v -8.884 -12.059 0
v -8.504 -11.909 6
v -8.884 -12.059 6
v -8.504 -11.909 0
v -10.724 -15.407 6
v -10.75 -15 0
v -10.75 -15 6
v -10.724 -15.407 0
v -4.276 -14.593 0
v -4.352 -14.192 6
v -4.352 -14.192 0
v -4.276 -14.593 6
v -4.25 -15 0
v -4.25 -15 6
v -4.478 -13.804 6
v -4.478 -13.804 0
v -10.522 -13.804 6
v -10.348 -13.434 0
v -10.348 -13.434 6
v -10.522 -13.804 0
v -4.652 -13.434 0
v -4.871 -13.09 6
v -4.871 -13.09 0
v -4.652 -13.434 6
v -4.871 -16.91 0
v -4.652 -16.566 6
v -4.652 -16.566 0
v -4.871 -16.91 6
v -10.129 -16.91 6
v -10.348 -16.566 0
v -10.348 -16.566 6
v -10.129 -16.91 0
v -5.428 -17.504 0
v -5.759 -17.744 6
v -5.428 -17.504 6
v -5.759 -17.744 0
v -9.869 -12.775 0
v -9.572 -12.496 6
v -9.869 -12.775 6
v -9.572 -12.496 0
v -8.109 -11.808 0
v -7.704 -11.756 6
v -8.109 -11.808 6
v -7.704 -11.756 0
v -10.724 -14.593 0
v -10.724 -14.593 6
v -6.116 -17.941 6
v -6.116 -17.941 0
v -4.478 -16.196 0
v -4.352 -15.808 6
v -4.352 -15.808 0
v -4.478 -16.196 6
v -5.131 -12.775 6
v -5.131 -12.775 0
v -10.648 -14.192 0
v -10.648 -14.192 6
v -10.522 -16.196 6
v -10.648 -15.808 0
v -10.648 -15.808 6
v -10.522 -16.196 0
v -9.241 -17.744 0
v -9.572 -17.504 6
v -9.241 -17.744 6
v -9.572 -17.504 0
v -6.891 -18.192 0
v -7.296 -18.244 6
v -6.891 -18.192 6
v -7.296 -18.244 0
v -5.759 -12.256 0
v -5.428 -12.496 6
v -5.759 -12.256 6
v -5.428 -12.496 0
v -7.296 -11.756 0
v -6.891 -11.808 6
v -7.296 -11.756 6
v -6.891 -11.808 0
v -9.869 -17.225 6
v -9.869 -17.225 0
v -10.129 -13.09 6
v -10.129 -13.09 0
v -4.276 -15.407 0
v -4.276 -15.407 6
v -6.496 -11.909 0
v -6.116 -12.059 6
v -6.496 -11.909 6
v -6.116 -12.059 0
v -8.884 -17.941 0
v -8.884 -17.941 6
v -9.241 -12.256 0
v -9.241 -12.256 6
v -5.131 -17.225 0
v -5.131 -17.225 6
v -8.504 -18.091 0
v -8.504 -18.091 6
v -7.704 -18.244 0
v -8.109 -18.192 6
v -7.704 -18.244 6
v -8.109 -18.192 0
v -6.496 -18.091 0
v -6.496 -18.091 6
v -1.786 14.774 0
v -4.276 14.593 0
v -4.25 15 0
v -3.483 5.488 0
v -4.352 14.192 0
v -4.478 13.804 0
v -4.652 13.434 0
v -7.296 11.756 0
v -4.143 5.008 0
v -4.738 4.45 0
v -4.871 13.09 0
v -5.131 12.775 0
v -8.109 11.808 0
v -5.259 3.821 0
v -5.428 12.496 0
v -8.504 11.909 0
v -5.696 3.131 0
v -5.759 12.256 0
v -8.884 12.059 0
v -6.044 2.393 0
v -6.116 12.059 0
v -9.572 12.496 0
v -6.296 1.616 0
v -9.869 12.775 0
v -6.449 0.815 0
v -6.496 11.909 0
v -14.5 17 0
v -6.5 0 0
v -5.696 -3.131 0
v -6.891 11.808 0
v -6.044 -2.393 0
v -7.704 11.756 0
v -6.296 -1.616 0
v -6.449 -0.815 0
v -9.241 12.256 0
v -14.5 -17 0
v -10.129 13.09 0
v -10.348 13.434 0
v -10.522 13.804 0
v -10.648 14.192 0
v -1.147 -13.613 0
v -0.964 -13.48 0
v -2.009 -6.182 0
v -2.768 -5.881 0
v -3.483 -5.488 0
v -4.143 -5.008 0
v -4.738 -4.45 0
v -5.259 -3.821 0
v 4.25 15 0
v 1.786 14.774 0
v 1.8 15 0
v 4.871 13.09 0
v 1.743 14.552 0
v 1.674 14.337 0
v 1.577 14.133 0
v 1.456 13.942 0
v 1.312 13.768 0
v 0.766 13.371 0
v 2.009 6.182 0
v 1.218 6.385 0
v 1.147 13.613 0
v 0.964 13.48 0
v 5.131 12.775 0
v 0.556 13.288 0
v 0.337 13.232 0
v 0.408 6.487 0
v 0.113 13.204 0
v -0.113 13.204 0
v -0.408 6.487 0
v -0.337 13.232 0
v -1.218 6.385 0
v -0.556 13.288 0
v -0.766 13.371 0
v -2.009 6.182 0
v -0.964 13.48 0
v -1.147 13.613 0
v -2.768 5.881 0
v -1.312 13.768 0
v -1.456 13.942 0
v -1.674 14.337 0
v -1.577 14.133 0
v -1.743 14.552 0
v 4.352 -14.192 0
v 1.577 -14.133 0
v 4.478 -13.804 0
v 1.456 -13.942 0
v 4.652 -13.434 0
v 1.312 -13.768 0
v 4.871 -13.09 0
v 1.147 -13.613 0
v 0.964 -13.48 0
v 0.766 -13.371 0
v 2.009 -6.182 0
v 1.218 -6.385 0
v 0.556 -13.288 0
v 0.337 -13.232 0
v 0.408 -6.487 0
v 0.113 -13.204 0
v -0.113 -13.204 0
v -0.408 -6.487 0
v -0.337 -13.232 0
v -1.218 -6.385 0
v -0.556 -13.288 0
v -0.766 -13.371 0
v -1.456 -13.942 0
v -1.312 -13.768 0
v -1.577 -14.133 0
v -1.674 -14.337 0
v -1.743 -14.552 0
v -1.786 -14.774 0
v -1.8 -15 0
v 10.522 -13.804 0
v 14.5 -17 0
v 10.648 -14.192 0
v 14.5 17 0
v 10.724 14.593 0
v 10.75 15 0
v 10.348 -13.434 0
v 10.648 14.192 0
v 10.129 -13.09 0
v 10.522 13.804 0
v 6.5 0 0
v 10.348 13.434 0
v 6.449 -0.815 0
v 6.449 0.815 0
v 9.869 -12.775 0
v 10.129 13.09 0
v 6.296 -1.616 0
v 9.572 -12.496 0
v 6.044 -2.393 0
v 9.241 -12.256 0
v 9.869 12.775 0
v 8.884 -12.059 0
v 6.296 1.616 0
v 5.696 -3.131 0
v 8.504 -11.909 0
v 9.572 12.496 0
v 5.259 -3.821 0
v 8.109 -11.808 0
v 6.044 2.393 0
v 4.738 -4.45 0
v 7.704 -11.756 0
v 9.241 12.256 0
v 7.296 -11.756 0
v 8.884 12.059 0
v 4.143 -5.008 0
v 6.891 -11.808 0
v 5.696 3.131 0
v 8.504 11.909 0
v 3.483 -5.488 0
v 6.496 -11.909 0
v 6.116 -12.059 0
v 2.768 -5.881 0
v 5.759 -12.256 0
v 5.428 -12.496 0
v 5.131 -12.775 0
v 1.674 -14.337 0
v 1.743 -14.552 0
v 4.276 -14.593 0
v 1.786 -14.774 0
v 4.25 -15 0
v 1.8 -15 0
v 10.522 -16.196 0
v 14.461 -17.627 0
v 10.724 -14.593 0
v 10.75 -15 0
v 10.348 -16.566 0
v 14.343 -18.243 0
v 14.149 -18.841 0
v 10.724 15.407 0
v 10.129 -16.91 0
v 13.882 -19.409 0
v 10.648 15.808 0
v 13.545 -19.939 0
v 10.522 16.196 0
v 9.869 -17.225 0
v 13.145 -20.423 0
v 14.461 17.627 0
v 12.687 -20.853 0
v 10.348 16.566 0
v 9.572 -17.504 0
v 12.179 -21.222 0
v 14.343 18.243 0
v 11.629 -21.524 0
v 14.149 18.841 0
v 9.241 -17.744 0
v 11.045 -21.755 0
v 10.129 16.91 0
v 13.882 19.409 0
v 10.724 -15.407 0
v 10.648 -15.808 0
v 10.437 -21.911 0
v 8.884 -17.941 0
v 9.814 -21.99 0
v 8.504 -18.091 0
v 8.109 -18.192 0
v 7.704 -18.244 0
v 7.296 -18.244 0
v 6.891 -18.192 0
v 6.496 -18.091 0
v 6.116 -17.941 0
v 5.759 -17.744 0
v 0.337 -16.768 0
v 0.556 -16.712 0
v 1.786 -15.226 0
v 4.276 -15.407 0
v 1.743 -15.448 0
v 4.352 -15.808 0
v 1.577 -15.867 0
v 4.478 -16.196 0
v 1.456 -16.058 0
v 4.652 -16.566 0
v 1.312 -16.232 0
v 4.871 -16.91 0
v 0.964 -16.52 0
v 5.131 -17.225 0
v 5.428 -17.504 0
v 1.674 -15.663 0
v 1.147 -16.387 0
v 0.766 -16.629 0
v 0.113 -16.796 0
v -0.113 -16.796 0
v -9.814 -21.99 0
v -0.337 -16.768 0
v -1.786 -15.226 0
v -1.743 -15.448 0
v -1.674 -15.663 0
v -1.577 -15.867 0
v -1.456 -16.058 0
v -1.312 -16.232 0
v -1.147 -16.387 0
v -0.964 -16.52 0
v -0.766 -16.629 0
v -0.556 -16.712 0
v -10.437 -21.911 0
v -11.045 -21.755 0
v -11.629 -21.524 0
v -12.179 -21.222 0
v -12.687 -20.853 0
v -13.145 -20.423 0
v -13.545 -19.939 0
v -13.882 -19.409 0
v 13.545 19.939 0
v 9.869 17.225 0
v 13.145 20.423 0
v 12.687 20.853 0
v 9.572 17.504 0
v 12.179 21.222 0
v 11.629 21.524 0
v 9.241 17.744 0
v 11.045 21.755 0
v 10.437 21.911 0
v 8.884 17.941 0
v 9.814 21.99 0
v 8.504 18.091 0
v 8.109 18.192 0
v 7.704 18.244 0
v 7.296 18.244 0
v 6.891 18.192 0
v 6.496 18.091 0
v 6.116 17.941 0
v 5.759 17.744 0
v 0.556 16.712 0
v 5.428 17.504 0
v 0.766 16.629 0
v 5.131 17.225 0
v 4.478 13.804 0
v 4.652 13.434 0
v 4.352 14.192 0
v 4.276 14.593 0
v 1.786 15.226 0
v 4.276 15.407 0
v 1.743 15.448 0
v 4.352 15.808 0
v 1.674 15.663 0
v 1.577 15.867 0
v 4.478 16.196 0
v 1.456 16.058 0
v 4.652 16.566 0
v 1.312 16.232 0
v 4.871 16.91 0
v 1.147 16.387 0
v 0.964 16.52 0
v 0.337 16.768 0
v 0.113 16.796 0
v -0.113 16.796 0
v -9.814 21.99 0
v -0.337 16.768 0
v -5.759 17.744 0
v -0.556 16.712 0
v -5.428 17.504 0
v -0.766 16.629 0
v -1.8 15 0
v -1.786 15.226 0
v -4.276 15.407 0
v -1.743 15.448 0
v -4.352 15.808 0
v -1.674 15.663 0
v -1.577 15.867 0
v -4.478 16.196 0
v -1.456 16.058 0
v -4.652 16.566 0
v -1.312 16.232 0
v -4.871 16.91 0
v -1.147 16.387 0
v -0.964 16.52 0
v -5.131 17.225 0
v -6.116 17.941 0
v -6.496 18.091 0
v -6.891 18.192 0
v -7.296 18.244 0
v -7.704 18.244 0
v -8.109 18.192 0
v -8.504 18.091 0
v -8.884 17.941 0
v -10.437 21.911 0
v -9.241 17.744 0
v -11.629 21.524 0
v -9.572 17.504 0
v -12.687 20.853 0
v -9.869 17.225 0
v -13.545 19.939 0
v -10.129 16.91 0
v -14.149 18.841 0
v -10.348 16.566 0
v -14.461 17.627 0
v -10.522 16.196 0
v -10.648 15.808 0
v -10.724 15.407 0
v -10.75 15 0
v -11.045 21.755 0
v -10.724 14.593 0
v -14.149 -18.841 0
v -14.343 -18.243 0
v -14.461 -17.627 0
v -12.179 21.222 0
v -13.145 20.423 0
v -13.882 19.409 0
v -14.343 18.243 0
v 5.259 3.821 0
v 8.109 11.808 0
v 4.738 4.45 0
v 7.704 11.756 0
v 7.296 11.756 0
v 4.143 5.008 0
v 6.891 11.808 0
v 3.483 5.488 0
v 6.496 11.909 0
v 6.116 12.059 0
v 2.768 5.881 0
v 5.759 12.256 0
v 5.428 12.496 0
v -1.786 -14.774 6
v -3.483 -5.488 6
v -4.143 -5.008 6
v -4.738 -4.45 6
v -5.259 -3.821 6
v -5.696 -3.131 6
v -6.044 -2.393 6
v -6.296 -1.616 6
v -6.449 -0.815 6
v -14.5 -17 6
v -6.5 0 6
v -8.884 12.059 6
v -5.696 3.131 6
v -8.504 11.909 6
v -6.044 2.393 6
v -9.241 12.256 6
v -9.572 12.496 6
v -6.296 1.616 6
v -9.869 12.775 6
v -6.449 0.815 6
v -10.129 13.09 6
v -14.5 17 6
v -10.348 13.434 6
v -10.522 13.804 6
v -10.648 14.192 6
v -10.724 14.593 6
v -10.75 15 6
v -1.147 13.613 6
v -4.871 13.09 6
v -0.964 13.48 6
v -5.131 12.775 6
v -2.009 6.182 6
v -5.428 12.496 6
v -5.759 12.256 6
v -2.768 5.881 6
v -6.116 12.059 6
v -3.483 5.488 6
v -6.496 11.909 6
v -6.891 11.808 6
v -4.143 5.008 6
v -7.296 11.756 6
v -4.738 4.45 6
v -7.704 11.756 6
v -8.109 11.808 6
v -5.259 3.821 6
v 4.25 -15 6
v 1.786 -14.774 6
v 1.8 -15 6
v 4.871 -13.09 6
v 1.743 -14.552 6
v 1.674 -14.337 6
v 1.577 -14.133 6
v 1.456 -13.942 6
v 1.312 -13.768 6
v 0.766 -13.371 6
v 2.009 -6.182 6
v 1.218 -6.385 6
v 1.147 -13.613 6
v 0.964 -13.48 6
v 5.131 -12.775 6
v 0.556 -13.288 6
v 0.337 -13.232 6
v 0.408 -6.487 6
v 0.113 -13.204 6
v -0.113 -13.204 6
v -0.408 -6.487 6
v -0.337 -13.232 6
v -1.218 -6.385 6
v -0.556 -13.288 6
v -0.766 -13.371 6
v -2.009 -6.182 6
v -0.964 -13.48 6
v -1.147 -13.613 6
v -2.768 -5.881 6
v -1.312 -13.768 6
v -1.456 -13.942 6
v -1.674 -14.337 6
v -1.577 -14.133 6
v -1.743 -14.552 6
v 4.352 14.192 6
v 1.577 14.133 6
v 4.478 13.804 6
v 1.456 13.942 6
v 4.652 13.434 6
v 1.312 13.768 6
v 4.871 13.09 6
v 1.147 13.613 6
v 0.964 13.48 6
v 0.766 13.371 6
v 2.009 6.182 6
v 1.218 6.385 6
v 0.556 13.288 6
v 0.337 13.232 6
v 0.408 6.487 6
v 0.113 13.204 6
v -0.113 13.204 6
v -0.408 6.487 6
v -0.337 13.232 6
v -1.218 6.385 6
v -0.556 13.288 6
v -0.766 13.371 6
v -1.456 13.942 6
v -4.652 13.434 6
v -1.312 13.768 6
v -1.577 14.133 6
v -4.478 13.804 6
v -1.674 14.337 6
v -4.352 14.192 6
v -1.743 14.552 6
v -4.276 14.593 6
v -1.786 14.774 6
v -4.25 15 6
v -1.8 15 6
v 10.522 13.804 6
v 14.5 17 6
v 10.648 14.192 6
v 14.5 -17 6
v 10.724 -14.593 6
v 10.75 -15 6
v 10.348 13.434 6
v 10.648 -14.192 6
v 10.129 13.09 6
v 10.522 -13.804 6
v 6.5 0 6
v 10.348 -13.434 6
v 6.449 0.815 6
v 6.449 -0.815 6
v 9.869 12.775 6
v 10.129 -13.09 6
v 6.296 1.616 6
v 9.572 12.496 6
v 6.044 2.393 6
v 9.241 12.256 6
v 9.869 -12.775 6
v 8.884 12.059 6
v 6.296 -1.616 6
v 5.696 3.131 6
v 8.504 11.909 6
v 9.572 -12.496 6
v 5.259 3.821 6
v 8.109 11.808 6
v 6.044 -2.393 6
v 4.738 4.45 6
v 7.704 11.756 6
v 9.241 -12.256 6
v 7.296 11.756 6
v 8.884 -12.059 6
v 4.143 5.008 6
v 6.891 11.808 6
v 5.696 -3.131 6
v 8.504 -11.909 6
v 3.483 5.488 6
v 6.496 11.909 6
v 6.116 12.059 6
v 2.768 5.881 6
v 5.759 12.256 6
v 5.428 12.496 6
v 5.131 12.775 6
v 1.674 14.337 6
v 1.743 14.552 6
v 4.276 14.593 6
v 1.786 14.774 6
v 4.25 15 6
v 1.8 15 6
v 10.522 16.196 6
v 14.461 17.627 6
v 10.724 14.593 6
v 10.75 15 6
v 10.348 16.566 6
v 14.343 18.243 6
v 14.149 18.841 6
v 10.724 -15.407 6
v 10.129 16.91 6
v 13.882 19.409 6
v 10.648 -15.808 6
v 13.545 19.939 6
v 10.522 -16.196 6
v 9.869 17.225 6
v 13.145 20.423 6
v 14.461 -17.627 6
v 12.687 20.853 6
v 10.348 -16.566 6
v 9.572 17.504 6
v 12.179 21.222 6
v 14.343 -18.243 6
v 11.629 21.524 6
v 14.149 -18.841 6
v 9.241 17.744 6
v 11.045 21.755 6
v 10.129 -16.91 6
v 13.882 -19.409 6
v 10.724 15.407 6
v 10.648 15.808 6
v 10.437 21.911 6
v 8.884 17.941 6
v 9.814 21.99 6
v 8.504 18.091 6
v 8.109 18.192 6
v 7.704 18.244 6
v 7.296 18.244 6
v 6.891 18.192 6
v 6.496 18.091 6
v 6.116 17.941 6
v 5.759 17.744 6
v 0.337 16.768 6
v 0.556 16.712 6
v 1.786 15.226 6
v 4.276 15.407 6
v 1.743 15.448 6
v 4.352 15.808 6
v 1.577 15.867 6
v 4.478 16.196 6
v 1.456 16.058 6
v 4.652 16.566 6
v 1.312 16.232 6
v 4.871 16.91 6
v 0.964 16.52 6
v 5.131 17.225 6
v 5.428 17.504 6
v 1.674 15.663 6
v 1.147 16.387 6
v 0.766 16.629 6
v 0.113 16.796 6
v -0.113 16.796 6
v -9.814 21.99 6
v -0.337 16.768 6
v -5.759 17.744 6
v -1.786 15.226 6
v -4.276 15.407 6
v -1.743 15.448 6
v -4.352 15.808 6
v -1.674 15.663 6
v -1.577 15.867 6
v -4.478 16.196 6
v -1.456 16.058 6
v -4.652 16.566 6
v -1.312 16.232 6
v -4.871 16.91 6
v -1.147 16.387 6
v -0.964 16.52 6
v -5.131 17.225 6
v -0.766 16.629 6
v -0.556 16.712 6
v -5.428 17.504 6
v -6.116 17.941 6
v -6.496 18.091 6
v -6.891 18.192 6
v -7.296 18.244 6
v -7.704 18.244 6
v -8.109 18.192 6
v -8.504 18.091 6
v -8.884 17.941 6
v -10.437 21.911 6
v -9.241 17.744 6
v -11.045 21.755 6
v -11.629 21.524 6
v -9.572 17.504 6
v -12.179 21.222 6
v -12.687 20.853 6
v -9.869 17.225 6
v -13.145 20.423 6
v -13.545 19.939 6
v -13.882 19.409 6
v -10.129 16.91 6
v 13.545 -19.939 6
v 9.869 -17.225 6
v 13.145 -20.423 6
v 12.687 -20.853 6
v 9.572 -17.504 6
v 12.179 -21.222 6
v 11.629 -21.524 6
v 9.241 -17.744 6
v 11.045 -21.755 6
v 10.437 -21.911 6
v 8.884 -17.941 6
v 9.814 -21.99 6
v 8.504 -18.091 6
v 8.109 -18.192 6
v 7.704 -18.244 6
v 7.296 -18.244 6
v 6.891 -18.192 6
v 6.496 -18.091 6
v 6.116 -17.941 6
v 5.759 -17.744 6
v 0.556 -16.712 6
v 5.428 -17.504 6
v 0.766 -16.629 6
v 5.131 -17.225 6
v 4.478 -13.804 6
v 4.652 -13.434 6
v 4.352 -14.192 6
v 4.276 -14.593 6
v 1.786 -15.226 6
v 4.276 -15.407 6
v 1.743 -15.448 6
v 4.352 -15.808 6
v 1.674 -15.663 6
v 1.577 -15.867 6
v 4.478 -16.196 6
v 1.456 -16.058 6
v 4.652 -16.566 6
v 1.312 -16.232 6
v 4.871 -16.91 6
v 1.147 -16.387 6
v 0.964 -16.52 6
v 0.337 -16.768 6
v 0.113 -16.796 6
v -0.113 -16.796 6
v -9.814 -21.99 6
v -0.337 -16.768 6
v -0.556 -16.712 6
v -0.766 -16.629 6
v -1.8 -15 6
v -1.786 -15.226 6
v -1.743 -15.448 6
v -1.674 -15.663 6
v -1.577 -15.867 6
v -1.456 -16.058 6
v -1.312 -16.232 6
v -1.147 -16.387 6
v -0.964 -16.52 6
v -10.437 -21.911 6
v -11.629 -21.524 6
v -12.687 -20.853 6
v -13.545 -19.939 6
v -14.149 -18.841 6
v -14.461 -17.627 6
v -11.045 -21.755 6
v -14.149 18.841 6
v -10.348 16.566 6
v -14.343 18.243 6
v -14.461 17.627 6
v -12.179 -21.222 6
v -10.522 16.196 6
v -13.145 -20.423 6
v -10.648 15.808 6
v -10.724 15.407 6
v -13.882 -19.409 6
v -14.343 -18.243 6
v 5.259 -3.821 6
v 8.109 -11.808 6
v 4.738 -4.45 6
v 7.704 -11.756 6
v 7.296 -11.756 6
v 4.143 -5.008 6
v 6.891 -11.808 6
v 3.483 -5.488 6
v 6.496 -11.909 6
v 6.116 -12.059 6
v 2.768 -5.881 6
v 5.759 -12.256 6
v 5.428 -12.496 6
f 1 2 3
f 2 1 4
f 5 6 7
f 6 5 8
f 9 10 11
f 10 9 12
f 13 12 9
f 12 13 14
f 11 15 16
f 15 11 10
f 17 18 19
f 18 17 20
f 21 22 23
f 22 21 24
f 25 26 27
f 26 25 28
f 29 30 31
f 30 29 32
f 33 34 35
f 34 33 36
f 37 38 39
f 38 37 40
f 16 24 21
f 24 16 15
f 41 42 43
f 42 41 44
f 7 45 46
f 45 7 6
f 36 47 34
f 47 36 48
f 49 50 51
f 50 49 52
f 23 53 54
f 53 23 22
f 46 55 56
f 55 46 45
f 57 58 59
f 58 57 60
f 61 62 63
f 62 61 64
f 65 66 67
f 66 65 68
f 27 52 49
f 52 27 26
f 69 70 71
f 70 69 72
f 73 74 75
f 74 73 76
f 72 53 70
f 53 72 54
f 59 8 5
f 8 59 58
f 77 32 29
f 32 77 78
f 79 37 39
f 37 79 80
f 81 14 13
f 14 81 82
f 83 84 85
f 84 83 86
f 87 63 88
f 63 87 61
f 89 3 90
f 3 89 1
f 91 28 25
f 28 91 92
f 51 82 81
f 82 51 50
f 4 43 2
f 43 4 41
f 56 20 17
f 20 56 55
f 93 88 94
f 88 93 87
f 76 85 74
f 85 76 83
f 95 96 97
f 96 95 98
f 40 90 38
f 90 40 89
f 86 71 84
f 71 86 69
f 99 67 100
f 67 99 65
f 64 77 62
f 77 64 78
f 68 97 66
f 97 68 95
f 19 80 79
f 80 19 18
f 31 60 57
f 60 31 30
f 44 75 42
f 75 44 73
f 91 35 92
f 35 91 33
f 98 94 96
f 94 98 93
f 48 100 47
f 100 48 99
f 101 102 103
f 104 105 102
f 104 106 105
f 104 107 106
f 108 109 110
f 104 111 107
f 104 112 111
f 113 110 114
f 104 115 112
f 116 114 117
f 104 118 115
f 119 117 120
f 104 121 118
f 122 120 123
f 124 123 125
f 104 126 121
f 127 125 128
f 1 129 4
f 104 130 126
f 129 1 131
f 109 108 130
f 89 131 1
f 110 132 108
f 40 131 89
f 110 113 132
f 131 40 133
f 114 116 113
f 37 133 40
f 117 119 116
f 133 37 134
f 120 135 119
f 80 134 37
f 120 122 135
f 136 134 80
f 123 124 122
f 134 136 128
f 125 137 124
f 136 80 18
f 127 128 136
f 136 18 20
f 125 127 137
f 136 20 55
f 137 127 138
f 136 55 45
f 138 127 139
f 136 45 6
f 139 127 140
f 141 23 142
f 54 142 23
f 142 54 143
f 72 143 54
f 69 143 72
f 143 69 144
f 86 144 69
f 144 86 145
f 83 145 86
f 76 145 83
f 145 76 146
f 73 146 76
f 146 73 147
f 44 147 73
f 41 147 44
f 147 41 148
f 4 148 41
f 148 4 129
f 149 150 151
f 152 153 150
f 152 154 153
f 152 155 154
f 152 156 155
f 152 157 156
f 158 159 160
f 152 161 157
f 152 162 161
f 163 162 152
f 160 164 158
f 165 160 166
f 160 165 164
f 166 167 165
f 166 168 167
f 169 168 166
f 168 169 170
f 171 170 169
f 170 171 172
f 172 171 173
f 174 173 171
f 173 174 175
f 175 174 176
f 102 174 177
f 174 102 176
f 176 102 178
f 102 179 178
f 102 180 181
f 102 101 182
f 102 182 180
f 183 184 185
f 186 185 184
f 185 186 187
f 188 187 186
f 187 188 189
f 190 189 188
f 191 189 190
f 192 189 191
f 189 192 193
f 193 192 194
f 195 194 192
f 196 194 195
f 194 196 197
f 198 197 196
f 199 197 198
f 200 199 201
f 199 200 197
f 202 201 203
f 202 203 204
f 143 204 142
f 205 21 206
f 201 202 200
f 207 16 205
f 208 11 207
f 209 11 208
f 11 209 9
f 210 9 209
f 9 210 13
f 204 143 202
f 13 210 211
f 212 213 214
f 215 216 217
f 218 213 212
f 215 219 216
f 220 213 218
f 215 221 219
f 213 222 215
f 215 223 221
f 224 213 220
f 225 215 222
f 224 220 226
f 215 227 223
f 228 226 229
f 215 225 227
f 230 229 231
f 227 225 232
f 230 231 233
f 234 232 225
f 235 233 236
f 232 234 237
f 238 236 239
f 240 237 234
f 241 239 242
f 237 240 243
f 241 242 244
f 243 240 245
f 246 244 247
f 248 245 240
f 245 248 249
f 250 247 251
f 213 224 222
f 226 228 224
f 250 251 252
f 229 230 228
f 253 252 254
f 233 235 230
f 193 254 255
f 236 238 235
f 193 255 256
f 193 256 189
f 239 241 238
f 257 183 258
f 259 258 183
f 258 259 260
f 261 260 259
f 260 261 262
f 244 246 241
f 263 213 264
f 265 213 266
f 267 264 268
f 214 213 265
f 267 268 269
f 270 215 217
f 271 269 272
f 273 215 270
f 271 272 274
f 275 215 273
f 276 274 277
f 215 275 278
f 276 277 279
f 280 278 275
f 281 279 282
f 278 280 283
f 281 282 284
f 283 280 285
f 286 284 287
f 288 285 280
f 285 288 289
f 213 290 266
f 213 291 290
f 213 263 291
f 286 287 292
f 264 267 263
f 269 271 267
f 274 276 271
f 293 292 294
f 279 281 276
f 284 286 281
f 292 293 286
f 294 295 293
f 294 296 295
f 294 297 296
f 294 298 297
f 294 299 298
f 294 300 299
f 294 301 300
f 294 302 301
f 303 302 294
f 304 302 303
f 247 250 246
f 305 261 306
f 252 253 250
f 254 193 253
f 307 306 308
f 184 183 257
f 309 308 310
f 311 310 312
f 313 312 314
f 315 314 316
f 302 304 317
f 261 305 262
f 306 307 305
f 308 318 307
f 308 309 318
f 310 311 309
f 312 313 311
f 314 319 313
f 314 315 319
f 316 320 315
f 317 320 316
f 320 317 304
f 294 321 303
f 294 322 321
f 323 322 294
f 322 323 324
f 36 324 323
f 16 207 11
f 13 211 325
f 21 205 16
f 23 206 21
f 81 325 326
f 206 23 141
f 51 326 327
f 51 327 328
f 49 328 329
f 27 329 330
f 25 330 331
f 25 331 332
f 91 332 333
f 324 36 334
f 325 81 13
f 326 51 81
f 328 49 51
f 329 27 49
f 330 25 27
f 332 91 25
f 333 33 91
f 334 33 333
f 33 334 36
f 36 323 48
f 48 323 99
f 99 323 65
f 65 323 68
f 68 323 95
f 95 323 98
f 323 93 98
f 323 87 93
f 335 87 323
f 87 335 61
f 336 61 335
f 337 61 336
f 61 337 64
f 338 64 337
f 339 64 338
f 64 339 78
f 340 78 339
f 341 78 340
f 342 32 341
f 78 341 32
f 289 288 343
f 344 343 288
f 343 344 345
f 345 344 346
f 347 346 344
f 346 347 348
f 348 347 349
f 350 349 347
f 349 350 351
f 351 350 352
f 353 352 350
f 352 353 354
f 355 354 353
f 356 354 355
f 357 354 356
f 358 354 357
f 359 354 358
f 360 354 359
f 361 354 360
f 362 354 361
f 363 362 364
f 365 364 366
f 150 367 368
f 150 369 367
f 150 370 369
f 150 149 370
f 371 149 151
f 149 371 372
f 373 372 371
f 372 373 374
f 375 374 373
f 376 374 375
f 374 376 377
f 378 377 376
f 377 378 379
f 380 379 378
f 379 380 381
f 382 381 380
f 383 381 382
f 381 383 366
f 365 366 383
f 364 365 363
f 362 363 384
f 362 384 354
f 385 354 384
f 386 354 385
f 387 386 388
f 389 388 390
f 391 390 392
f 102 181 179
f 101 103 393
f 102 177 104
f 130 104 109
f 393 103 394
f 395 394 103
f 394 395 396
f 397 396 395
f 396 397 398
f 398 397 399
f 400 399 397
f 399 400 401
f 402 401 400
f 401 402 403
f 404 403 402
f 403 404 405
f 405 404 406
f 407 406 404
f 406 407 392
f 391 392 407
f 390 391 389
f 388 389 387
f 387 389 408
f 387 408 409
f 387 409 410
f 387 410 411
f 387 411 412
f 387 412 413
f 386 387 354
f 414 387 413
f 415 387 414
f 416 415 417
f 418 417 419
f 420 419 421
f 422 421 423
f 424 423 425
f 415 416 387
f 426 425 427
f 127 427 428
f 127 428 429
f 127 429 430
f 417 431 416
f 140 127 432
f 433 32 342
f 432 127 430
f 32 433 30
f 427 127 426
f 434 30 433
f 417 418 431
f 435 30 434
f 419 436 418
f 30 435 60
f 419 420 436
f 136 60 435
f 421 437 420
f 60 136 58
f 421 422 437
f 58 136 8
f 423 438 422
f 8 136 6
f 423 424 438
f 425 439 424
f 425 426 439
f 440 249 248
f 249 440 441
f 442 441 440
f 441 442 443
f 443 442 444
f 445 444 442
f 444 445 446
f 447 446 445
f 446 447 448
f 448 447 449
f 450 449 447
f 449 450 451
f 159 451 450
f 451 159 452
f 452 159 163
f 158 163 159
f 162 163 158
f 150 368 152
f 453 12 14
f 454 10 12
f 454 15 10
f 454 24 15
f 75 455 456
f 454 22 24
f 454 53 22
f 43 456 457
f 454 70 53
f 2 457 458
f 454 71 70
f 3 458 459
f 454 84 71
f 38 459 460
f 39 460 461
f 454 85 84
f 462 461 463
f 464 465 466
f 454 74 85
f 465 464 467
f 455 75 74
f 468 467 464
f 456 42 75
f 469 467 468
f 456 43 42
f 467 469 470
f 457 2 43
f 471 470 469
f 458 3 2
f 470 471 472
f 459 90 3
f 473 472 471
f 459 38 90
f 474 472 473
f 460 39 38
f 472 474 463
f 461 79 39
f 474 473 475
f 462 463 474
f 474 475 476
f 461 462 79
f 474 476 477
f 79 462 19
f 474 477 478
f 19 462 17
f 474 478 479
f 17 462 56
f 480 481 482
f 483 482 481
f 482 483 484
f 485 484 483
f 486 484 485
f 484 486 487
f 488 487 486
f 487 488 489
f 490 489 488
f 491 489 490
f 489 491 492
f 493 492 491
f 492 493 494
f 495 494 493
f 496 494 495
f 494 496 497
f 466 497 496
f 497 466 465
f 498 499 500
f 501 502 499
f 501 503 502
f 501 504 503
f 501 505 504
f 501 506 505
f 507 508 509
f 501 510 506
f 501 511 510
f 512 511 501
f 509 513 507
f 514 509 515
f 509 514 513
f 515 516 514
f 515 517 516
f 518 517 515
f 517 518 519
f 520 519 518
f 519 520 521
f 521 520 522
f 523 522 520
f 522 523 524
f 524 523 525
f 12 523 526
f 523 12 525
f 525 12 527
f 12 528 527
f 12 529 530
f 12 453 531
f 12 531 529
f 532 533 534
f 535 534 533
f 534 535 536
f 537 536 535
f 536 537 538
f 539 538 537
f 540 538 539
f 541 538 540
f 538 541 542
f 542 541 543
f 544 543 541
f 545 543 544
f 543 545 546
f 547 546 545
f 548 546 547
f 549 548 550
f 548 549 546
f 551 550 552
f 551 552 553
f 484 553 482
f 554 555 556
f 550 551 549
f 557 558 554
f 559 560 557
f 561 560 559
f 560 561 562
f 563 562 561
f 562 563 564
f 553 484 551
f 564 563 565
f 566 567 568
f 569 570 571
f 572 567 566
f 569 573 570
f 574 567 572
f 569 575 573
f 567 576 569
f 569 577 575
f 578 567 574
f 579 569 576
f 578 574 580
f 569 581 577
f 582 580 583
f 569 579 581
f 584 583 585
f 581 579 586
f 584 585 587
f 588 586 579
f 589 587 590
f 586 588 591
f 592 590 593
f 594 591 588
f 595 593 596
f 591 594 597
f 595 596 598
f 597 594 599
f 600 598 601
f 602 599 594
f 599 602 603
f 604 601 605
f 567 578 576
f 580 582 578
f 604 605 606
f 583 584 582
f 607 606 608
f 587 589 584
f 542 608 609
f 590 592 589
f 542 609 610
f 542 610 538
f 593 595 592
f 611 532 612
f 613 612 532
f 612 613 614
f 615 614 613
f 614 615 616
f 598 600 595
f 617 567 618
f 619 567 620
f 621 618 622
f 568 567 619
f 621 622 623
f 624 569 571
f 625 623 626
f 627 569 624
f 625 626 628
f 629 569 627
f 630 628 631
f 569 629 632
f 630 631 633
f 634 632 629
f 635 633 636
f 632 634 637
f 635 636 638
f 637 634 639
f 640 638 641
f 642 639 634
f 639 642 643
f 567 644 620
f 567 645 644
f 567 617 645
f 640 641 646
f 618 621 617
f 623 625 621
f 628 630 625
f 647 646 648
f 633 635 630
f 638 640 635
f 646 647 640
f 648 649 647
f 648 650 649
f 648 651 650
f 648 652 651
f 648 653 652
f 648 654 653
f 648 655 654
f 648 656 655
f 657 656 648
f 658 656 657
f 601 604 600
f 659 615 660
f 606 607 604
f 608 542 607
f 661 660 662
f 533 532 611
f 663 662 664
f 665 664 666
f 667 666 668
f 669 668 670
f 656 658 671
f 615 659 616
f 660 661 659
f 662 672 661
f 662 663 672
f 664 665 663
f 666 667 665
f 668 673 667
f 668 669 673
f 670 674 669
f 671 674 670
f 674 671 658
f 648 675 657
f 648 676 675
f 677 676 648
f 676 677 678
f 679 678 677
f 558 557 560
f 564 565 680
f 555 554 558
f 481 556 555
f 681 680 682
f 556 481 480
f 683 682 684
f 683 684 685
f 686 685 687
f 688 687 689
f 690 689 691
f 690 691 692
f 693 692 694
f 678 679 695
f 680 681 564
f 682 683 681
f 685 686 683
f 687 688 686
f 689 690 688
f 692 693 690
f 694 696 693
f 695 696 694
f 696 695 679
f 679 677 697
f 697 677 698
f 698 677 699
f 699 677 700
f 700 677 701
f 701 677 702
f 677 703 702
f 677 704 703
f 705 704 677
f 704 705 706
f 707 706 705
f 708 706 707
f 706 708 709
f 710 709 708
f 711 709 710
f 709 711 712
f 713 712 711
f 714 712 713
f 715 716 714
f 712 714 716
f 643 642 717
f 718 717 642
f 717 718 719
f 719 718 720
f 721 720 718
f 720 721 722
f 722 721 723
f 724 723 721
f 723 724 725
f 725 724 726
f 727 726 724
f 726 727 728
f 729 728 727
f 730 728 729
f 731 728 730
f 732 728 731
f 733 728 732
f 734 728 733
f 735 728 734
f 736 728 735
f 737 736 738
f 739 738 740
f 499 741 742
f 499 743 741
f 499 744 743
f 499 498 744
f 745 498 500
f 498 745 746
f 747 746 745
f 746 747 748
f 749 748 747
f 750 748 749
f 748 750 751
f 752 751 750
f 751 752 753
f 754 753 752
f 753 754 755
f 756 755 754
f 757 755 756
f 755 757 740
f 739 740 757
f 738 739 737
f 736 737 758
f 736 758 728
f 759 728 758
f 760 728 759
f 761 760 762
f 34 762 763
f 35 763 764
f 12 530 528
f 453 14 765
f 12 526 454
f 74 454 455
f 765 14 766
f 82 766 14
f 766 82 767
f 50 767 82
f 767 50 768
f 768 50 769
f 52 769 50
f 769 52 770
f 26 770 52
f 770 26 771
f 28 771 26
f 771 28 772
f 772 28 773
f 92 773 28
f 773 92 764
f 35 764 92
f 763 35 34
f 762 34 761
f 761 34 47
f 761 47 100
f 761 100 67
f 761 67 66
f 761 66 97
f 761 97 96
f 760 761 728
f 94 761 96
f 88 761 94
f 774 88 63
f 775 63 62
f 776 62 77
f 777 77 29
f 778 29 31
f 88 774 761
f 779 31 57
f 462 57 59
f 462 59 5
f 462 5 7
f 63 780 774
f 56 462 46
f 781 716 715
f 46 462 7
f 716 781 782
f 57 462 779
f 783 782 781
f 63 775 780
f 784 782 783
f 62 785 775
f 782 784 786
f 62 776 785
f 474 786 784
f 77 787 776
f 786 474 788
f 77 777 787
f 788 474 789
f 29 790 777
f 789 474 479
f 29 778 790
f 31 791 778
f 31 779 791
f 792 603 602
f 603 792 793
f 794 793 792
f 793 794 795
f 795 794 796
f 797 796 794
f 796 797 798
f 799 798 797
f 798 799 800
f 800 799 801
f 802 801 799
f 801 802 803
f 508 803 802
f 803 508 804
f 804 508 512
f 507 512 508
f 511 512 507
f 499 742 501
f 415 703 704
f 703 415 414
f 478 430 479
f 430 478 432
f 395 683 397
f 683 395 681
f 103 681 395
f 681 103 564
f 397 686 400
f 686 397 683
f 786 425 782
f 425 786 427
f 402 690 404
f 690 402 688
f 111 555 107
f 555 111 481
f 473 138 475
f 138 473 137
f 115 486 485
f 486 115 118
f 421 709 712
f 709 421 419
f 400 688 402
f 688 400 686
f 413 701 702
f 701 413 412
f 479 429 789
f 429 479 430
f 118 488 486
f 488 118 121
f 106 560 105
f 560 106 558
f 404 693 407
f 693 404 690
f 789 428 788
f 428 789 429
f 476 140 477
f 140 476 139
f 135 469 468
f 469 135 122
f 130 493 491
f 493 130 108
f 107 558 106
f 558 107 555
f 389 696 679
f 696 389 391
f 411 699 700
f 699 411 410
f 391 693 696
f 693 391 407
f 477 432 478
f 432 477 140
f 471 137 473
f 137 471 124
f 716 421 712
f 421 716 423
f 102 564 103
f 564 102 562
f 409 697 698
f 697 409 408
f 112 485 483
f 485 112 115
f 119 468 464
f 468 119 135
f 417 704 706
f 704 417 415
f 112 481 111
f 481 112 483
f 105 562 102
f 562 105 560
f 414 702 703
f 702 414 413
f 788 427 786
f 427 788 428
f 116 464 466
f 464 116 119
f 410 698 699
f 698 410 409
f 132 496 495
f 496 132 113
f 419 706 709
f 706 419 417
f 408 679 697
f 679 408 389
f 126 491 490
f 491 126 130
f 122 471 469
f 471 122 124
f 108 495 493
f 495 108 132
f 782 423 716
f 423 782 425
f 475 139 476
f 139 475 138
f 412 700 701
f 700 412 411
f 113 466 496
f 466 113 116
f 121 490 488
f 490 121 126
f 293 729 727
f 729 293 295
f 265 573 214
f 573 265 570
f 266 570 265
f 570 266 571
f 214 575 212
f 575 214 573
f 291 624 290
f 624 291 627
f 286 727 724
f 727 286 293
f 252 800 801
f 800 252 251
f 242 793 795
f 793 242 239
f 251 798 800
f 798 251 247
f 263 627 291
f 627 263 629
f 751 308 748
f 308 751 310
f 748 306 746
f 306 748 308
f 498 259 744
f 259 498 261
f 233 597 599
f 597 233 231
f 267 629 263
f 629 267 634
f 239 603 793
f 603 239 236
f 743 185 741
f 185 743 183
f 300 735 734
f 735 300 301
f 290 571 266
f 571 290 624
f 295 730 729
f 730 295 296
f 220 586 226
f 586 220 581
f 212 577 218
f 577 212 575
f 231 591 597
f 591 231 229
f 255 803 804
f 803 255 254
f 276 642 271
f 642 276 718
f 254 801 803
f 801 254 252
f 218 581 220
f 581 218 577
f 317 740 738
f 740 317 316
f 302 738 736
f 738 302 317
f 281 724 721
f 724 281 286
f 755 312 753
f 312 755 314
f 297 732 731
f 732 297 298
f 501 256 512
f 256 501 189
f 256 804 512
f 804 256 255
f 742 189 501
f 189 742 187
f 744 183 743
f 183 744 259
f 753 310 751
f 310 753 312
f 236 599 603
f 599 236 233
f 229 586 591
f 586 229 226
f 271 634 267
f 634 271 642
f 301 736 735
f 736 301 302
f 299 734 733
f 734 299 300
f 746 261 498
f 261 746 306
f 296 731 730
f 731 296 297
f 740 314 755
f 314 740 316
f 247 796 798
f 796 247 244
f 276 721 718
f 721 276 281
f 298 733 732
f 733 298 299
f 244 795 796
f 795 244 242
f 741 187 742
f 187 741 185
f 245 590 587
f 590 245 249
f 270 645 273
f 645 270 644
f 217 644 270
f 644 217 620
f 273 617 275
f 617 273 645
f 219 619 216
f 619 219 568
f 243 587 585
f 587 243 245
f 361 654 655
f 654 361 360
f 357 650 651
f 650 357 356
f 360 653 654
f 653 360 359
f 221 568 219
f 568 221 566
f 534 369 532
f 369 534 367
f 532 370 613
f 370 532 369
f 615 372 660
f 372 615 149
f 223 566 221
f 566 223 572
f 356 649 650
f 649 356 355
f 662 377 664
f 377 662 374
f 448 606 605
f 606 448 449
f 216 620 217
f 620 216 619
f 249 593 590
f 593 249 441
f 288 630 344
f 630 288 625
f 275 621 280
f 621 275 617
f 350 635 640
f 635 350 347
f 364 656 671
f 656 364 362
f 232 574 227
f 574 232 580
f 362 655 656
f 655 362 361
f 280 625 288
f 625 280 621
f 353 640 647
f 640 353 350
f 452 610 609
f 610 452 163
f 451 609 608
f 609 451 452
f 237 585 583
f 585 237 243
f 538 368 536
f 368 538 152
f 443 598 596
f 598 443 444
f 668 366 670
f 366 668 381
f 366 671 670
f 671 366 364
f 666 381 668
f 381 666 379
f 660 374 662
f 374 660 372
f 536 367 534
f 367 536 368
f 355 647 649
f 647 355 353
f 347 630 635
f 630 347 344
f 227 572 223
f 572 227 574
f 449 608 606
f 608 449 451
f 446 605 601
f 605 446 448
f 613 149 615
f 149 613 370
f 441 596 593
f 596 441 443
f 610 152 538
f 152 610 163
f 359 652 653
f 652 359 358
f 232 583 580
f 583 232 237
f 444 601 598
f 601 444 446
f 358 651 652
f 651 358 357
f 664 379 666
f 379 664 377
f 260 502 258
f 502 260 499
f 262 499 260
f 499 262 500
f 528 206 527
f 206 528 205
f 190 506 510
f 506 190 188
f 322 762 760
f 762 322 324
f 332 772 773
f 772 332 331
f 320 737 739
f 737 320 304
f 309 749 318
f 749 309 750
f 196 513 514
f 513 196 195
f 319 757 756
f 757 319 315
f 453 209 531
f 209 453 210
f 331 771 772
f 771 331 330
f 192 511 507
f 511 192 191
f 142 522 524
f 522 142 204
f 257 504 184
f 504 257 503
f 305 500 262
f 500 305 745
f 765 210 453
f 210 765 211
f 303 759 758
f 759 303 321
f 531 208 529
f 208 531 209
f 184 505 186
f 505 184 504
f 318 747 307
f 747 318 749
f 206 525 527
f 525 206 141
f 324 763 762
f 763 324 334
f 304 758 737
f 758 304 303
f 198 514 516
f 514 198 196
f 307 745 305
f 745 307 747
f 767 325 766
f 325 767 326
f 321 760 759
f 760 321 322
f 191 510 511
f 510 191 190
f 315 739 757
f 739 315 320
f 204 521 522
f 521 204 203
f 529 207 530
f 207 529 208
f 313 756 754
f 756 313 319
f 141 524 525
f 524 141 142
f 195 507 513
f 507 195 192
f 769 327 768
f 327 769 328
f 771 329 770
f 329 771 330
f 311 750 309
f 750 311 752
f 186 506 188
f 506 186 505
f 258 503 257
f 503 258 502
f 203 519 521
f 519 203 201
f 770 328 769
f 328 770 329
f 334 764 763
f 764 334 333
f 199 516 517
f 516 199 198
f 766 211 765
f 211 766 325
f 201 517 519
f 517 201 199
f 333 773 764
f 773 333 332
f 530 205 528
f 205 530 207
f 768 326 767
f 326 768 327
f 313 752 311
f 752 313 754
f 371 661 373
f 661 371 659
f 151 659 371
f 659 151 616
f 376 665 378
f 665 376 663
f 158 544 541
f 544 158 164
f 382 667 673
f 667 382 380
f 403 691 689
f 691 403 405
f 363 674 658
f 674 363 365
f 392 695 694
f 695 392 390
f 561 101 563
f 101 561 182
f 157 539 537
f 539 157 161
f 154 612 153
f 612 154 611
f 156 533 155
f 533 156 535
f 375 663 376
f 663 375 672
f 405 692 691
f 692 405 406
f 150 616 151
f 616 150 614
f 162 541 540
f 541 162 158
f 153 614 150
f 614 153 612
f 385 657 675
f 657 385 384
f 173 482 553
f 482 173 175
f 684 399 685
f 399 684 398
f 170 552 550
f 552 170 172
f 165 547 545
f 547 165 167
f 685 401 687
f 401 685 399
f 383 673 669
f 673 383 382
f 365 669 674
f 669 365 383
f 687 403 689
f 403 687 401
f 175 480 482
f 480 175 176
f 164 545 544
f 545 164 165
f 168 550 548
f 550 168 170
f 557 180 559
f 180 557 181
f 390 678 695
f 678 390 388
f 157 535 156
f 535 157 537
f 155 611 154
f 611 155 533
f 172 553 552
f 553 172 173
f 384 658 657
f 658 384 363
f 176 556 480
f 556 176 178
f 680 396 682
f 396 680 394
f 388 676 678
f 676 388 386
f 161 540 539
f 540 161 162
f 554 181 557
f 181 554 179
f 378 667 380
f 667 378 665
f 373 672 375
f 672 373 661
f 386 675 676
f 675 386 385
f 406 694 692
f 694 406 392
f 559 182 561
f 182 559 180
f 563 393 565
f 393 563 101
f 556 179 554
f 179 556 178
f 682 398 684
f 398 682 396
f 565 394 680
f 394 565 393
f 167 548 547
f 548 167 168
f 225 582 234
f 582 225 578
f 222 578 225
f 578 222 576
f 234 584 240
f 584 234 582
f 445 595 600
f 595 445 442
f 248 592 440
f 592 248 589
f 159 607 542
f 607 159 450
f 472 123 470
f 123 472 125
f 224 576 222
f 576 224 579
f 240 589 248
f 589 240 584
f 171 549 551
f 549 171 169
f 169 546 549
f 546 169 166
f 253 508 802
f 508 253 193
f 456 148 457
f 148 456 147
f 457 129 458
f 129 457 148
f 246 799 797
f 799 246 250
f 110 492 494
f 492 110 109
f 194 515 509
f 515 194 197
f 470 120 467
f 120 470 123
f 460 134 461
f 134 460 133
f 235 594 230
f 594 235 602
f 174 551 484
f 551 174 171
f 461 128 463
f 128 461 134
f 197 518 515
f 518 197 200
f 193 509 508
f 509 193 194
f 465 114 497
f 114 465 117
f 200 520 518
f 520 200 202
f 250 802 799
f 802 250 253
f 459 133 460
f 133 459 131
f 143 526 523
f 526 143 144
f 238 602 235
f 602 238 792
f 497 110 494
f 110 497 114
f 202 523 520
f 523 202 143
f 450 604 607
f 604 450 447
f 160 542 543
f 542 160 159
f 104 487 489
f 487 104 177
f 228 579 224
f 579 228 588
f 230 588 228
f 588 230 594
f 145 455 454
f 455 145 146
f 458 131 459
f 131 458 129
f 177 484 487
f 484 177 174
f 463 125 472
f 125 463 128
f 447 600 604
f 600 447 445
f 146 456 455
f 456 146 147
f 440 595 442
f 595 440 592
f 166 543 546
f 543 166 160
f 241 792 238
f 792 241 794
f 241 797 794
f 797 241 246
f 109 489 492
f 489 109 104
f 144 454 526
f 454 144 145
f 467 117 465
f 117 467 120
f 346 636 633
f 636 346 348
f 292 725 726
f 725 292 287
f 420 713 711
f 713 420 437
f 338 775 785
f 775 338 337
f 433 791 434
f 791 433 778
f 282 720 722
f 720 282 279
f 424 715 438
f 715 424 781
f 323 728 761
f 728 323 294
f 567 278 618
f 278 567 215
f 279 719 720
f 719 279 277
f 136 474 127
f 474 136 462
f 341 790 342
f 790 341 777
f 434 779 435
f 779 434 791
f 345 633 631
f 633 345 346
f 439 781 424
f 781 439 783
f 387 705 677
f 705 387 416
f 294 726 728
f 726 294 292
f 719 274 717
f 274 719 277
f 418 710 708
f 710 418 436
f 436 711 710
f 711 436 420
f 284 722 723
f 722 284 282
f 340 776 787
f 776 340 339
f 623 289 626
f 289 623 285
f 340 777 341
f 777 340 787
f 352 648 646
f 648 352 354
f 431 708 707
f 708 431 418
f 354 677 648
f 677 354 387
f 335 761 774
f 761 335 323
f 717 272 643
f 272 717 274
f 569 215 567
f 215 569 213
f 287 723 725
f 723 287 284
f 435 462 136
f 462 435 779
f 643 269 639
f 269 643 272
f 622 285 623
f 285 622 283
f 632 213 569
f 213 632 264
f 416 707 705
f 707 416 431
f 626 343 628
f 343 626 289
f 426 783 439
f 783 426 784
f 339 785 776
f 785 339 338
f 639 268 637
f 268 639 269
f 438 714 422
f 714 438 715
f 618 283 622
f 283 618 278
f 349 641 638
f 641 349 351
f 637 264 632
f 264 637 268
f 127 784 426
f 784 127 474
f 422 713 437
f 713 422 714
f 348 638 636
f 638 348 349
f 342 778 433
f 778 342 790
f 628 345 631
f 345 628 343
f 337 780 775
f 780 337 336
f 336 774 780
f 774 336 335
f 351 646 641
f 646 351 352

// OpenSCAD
$fn = 50;

difference() {
	union() {
		hull() {
			translate(v = [-9.5, 17.0, 0]) {
				cylinder(h = 6, r = 5);
			}
			translate(v = [9.5, 17.0, 0]) {
				cylinder(h = 6, r = 5);
			}
			translate(v = [-9.5, -17.0, 0]) {
				cylinder(h = 6, r = 5);
			}
			translate(v = [9.5, -17.0, 0]) {
				cylinder(h = 6, r = 5);
			}
		}
	}
	union() {
		translate(v = [-7.5, -15.0, 0]) {
			cylinder(h = 6, r = 3.25);
		}
		translate(v = [-7.5, 15.0, 0]) {
			cylinder(h = 6, r = 3.25);
		}
		translate(v = [7.5, -15.0, 0]) {
			cylinder(h = 6, r = 3.25);
		}
		translate(v = [7.5, 15.0, 0]) {
			cylinder(h = 6, r = 3.25);
		}
		translate(v = [0.0, -15.0, 0]) {
			cylinder(h = 6, r = 1.8);
		}
		translate(v = [0.0, 15.0, 0]) {
			cylinder(h = 6, r = 1.8);
		}
		cylinder(h = 6, r = 6.5);
	}
}
